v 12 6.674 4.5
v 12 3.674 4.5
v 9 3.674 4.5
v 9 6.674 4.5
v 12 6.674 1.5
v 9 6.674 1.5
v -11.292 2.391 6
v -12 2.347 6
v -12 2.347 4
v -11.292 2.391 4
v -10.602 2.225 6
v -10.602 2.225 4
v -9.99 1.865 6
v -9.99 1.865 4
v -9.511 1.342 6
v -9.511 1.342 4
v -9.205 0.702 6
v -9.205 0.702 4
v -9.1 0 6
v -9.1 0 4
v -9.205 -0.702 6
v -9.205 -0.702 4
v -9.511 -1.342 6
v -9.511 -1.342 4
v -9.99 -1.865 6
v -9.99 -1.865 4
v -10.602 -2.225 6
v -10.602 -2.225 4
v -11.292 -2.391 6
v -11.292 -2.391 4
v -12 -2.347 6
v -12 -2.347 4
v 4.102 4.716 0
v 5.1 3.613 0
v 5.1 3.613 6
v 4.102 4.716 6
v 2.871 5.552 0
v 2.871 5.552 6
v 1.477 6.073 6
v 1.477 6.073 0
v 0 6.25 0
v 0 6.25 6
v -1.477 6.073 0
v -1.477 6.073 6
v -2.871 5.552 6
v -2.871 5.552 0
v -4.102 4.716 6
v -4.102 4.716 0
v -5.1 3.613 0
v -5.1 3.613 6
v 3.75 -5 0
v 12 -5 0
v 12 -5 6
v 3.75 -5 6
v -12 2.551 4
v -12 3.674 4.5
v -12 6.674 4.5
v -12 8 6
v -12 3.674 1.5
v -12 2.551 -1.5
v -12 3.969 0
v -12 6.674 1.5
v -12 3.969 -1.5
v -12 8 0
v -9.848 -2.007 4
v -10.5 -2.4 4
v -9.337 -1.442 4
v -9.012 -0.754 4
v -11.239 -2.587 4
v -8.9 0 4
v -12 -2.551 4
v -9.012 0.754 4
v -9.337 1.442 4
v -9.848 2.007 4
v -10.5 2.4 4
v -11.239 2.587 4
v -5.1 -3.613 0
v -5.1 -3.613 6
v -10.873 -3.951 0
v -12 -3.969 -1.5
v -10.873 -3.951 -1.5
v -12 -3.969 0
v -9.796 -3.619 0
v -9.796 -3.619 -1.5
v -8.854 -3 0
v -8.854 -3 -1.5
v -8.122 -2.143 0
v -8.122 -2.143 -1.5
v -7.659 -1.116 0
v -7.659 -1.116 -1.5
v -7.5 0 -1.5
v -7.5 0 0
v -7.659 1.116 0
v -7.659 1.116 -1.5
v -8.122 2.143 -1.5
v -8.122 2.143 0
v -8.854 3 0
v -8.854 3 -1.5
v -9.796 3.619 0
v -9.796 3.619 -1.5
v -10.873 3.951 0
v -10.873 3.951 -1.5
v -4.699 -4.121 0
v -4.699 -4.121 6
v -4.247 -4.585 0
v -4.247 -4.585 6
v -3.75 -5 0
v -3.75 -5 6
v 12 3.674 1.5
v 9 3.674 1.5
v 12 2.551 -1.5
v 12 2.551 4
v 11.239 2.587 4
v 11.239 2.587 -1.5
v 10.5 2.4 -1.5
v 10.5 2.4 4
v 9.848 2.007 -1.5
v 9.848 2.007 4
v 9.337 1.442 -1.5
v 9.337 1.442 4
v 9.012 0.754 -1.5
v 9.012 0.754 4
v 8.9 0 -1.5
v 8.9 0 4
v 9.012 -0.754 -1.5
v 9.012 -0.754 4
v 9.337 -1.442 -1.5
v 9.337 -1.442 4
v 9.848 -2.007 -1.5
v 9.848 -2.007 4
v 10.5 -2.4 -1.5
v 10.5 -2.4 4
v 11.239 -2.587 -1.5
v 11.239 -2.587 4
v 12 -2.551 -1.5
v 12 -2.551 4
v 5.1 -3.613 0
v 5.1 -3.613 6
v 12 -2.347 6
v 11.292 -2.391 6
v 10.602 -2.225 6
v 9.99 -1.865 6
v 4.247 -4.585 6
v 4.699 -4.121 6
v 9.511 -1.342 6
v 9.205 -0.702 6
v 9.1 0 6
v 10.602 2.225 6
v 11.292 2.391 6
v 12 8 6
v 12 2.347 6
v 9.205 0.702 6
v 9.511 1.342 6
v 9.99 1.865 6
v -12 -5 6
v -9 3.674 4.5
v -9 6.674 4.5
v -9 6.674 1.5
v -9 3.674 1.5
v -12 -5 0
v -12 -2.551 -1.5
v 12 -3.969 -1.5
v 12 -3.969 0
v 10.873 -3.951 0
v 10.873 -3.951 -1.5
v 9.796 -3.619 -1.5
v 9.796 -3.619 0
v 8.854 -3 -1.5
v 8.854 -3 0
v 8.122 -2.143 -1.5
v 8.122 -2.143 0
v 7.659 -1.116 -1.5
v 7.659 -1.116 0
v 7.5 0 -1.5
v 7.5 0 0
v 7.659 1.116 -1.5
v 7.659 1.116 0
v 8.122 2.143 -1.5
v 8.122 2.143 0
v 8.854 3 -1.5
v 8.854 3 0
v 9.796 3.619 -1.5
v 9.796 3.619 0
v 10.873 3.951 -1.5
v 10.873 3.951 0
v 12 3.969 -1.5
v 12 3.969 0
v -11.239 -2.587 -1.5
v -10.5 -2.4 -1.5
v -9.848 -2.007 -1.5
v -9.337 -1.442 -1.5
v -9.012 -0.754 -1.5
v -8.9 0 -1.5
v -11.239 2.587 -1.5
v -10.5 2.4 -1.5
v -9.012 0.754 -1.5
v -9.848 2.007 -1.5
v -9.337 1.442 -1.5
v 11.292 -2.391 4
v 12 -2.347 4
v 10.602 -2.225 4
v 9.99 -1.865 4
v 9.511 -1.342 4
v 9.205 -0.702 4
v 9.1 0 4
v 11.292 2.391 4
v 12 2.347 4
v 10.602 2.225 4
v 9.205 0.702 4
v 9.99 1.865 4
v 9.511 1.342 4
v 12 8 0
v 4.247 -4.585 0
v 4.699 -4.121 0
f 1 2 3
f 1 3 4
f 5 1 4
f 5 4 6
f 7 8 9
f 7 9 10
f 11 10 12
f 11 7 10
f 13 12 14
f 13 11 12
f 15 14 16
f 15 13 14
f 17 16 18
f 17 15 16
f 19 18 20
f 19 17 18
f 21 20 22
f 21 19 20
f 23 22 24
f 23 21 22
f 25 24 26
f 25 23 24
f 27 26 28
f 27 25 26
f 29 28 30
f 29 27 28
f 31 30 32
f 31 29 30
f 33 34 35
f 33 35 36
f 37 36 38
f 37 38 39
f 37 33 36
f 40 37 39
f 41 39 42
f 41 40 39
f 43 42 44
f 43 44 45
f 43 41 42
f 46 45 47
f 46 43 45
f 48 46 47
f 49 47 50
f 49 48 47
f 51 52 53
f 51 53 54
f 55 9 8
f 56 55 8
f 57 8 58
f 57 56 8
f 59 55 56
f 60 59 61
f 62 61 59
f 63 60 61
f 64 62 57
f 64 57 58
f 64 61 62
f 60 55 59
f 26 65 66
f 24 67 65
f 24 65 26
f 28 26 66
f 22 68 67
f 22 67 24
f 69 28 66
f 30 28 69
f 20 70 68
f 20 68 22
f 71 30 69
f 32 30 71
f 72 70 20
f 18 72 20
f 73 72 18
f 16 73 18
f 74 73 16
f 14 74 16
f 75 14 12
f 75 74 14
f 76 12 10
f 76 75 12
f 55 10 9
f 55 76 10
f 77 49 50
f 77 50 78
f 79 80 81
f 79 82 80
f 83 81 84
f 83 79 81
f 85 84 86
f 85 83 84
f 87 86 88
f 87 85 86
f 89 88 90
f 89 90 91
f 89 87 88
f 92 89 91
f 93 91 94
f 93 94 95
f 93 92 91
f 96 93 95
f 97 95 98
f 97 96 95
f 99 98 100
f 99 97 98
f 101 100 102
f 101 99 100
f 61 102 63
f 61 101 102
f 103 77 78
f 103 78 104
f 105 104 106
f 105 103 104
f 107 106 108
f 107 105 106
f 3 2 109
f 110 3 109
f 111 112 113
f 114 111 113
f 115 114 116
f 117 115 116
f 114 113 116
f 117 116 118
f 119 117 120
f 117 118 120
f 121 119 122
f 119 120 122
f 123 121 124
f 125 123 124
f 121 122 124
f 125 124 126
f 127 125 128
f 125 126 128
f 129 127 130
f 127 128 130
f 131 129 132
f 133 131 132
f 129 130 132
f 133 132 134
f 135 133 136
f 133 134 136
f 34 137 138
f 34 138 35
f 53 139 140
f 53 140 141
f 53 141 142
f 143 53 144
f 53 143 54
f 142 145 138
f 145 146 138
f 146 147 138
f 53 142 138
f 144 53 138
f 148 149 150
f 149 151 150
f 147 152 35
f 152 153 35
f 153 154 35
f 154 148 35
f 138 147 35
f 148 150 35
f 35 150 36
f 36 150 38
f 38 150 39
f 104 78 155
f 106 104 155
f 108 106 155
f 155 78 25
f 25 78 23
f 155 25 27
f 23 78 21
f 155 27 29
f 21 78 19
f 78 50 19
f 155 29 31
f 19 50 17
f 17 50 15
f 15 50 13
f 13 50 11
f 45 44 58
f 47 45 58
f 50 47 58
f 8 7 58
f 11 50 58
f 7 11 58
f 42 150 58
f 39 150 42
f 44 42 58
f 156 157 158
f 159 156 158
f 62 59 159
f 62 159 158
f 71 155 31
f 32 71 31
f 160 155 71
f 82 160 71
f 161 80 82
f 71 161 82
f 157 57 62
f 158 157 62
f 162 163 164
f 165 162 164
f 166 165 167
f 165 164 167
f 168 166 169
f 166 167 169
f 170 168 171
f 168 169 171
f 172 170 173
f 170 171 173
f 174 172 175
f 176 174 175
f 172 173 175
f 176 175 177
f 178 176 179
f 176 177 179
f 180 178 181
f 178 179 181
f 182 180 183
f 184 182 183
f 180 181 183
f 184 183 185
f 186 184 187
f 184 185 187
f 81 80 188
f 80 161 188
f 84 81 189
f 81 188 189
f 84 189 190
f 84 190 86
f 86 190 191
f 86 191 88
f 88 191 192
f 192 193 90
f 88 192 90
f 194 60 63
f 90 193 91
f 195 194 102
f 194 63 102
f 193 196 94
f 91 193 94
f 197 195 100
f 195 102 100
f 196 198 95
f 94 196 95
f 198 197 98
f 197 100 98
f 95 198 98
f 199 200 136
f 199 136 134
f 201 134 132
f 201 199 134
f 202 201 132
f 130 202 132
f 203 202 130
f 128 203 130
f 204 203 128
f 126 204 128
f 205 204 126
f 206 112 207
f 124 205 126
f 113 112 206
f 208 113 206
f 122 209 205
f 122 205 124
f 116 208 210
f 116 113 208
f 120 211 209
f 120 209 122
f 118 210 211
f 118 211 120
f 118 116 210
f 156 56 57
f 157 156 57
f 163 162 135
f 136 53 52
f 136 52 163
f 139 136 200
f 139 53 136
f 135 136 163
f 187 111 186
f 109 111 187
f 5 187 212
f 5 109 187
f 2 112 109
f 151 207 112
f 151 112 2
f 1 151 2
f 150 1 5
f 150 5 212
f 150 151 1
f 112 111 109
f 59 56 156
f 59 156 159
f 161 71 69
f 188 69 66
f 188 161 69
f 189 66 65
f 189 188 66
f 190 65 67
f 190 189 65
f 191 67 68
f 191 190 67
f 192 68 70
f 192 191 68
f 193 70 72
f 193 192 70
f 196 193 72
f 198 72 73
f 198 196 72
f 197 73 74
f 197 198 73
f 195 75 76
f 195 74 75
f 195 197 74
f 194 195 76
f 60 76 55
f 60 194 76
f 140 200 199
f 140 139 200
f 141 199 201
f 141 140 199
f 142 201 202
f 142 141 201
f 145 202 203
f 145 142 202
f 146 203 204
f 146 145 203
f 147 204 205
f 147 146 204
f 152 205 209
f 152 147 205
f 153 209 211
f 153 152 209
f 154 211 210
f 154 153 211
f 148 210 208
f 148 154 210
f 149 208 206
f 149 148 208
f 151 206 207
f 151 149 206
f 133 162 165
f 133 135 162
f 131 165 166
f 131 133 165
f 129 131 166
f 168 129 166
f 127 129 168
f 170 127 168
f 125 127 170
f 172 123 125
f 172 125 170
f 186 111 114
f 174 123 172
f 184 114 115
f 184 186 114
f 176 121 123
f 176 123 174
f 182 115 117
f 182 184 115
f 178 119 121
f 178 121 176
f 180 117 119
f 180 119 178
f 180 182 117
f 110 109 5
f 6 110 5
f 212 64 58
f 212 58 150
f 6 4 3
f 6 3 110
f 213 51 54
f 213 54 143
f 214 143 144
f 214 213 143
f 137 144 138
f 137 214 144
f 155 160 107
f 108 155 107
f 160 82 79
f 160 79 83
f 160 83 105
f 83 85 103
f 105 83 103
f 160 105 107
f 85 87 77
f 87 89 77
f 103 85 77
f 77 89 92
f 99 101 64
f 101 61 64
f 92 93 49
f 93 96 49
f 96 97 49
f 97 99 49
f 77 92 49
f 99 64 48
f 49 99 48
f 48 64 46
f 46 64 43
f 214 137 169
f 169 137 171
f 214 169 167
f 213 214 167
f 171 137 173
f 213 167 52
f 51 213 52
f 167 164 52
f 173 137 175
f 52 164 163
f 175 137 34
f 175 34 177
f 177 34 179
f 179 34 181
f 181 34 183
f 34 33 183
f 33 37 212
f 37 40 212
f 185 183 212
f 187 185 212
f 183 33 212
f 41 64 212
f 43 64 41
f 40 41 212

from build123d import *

# Parameters (mm, degrees)
SKETCH1_R            = 1
BOSS_EXTRUDE1_DEPTH  = 6
SKETCH2_R            = 2.6
CUT_EXTRUDE1_DEPTH   = 6
SKETCH3_W            = 7.6
SKETCH3_H            = 13
BOSS_EXTRUDE2_DEPTH  = 6
BOSS_EXTRUDE5_START  = -5
SKETCH6_W            = 3
SKETCH6_H            = 2
BOSS_EXTRUDE5_DEPTH  = 13
BOSS_EXTRUDE6_START  = -6
SKETCH10_R           = 4
SKETCH10_R_2         = 2.6
BOSS_EXTRUDE6_DEPTH  = 1.5
BOSS_EXTRUDE7_START  = -6
SKETCH12_R           = 2.6
SKETCH12_R_2         = 2.4
BOSS_EXTRUDE7_DEPTH  = 2
CUT_EXTRUDE2_DEPTH   = 7
SKETCH14_W           = 3
SKETCH14_H           = 6
CUT_EXTRUDE3_DEPTH   = 2
SKETCH15_W           = 0.2
SKETCH15_H           = 13
CUT_EXTRUDE5_DEPTH   = 7.5
SKETCH16_W           = 3
SKETCH16_H           = 3
CUT_EXTRUDE6_DEPTH   = 3
SKETCH17_W           = 2.8
SKETCH17_H           = 2.8
BOSS_EXTRUDE9_DEPTH  = 3
BOSS_EXTRUDE10_START = 24.4
SKETCH17_2_W         = 2.8
SKETCH17_2_H         = 2.8
BOSS_EXTRUDE10_DEPTH = 3
SKETCH18_W           = 5.7
SKETCH18_H           = 13
SKETCH18_W_2         = 13.3
CUT_EXTRUDE7_DEPTH   = 9
SKETCH19_W           = 3
SKETCH19_H           = 3
CUT_EXTRUDE8_DEPTH   = 3
CUT_EXTRUDE10_START  = -24
SKETCH19_3_W         = 3
SKETCH19_3_H         = 3
CUT_EXTRUDE10_DEPTH  = 3


with BuildPart() as part:
    # Sketch1 → Boss-Extrude1 (new body)
    with BuildSketch(Plane.XY):
        with BuildLine():
            ThreePointArc((3.75, -5), (4.47902769, -4.358991965), (5.1, -3.61282438))
            Line((5.1, -3.61282438), (5.1, 3.61282438))
            ThreePointArc((5.1, 3.61282438), (0, 6.25), (-5.1, 3.61282438))
            Line((-5.1, 3.61282438), (-5.1, -3.61282438))
            ThreePointArc((-5.1, -3.61282438), (-4.47902769, -4.358991965), (-3.75, -5))
            Line((-3.75, -5), (-14.7, -5))
            Line((-14.7, -5), (-14.7, 8))
            Line((-14.7, 8), (14.7, 8))
            Line((14.7, 8), (14.7, -5))
            Line((14.7, -5), (3.75, -5))
        make_face()
        with Locations((11.5, 0)):
            Circle(SKETCH1_R, mode=Mode.SUBTRACT)
        with Locations((-11.5, 0)):
            Circle(SKETCH1_R, mode=Mode.SUBTRACT)
    extrude(amount=BOSS_EXTRUDE1_DEPTH)

    # Sketch2 → Cut-Extrude1 (cut)
    with BuildSketch(Plane.XY):
        with Locations((-11.5, 0)):
            Circle(SKETCH2_R)
        with Locations((11.5, 0)):
            Circle(SKETCH2_R)
    extrude(amount=CUT_EXTRUDE1_DEPTH, mode=Mode.SUBTRACT)

    # Sketch3 → Boss-Extrude2 (add)
    with BuildSketch(Plane.XY):
        with Locations((-18.5, 1.5)):
            Rectangle(SKETCH3_W, SKETCH3_H)
    extrude(amount=BOSS_EXTRUDE2_DEPTH)

    # Sketch6 → Boss-Extrude5 (add)
    with BuildSketch(Plane(origin=(0, 0, 0), x_dir=(1, 0, 0), z_dir=(0, 1, 0)).offset(BOSS_EXTRUDE5_START)):
        with Locations((-23.8, -3)):
            Rectangle(SKETCH6_W, SKETCH6_H)
        with Locations((16.2, -3)):
            Rectangle(SKETCH6_W, SKETCH6_H)
    extrude(amount=BOSS_EXTRUDE5_DEPTH)

    # Sketch10 → Boss-Extrude6 (add)
    with BuildSketch(Plane.XY.offset(6).offset(BOSS_EXTRUDE6_START)):
        with Locations((-11.5, 0)):
            Circle(SKETCH10_R)
        with Locations((-11.5, 0)):
            Circle(SKETCH10_R_2, mode=Mode.SUBTRACT)
        with BuildLine():
            Line((14.7, 2.4), (14.7, -2.4))
            ThreePointArc((14.7, -2.4), (7.5, 0), (14.7, 2.4))
        make_face()
        with Locations((11.5, 0)):
            Circle(SKETCH10_R_2, mode=Mode.SUBTRACT)
    extrude(amount=-BOSS_EXTRUDE6_DEPTH)

    # Sketch12 → Boss-Extrude7 (add)
    with BuildSketch(Plane(origin=(0, 0, 0), x_dir=(-1, 0, 0), z_dir=(0, 0, -1)).offset(BOSS_EXTRUDE7_START)):
        with Locations((11.5, 0)):
            Circle(SKETCH12_R)
        with Locations((11.5, 0)):
            Circle(SKETCH12_R_2, mode=Mode.SUBTRACT)
        with Locations((-11.5, 0)):
            Circle(SKETCH12_R)
        with Locations((-11.5, 0)):
            Circle(SKETCH12_R_2, mode=Mode.SUBTRACT)
    extrude(amount=BOSS_EXTRUDE7_DEPTH)

    # Sketch13 → Cut-Extrude2 (cut)
    with BuildSketch(Plane.XZ.offset(5)):
        Polygon((-22.3, 0), (-16.3, 0), (-16.3, 2), (-17.8, 2), (-17.8, 6), (-20.8, 6), (-20.8, 2), (-22.3, 2), align=None)
    extrude(amount=-CUT_EXTRUDE2_DEPTH, mode=Mode.SUBTRACT)

    # Sketch14 → Cut-Extrude3 (cut)
    with BuildSketch(Plane(origin=(0, 0, 0), x_dir=(-1, 0, 0), z_dir=(0, 0, -1))):
        with Locations((19.3, 5)):
            Rectangle(SKETCH14_W, SKETCH14_H)
    extrude(amount=-CUT_EXTRUDE3_DEPTH, mode=Mode.SUBTRACT)

    # Sketch15 → Cut-Extrude5 (cut, symmetric)
    with BuildSketch(Plane.XY):
        with Locations((-12.1, 1.5)):
            Rectangle(SKETCH15_W, SKETCH15_H)
        with Locations((12.1, 1.5)):
            Rectangle(SKETCH15_W, SKETCH15_H)
    extrude(amount=CUT_EXTRUDE5_DEPTH, both=True, mode=Mode.SUBTRACT)

    # Sketch16 → Cut-Extrude6 (cut)
    with BuildSketch(Plane(origin=(12, 0, 0), x_dir=(0, 0, -1), z_dir=(1, 0, 0))):
        with Locations((-3, 5.173669459)):
            Rectangle(SKETCH16_W, SKETCH16_H)
    cut_extrude6 = extrude(amount=-CUT_EXTRUDE6_DEPTH, mode=Mode.SUBTRACT)

    # Mirror1: Cut-Extrude6 across plane
    add(cut_extrude6.mirror(Plane(origin=(0, 0, 0), x_dir=(0, 0, 1), z_dir=(1, 0, 0))), mode=Mode.SUBTRACT)

    # Sketch17 → Boss-Extrude9 (add)
    with BuildSketch(Plane(origin=(-12.2, 0, 0), x_dir=(0, 0, -1), z_dir=(1, 0, 0))):
        with Locations((-3, 5.173669459)):
            Rectangle(SKETCH17_W, SKETCH17_H)
    extrude(amount=BOSS_EXTRUDE9_DEPTH)

    # Sketch17<2> → Boss-Extrude10 (add)
    with BuildSketch(Plane(origin=(-12.2, 0, 0), x_dir=(0, 0, -1), z_dir=(1, 0, 0)).offset(BOSS_EXTRUDE10_START)):
        with Locations((-3, 5.173669459)):
            Rectangle(SKETCH17_2_W, SKETCH17_2_H)
    extrude(amount=-BOSS_EXTRUDE10_DEPTH)

    # Sketch18 → Cut-Extrude7 (cut, symmetric)
    with BuildSketch(Plane.XY):
        with Locations((14.85, 1.5)):
            Rectangle(SKETCH18_W, SKETCH18_H)
        with Locations((-18.65, 1.5)):
            Rectangle(SKETCH18_W_2, SKETCH18_H)
    extrude(amount=CUT_EXTRUDE7_DEPTH, both=True, mode=Mode.SUBTRACT)

    # Sketch19 → Cut-Extrude8 (cut)
    with BuildSketch(Plane(origin=(12, 0, 0), x_dir=(0, 0, -1), z_dir=(1, 0, 0))):
        with Locations((-3, 5.173669459)):
            Rectangle(SKETCH19_W, SKETCH19_H)
    extrude(amount=-CUT_EXTRUDE8_DEPTH, mode=Mode.SUBTRACT)

    # Sketch19<3> → Cut-Extrude10 (cut)
    with BuildSketch(Plane(origin=(12, 0, 0), x_dir=(0, 0, -1), z_dir=(1, 0, 0)).offset(CUT_EXTRUDE10_START)):
        with Locations((-3, 5.173669459)):
            Rectangle(SKETCH19_3_W, SKETCH19_3_H)
    extrude(amount=CUT_EXTRUDE10_DEPTH, mode=Mode.SUBTRACT)


solid = part.part
